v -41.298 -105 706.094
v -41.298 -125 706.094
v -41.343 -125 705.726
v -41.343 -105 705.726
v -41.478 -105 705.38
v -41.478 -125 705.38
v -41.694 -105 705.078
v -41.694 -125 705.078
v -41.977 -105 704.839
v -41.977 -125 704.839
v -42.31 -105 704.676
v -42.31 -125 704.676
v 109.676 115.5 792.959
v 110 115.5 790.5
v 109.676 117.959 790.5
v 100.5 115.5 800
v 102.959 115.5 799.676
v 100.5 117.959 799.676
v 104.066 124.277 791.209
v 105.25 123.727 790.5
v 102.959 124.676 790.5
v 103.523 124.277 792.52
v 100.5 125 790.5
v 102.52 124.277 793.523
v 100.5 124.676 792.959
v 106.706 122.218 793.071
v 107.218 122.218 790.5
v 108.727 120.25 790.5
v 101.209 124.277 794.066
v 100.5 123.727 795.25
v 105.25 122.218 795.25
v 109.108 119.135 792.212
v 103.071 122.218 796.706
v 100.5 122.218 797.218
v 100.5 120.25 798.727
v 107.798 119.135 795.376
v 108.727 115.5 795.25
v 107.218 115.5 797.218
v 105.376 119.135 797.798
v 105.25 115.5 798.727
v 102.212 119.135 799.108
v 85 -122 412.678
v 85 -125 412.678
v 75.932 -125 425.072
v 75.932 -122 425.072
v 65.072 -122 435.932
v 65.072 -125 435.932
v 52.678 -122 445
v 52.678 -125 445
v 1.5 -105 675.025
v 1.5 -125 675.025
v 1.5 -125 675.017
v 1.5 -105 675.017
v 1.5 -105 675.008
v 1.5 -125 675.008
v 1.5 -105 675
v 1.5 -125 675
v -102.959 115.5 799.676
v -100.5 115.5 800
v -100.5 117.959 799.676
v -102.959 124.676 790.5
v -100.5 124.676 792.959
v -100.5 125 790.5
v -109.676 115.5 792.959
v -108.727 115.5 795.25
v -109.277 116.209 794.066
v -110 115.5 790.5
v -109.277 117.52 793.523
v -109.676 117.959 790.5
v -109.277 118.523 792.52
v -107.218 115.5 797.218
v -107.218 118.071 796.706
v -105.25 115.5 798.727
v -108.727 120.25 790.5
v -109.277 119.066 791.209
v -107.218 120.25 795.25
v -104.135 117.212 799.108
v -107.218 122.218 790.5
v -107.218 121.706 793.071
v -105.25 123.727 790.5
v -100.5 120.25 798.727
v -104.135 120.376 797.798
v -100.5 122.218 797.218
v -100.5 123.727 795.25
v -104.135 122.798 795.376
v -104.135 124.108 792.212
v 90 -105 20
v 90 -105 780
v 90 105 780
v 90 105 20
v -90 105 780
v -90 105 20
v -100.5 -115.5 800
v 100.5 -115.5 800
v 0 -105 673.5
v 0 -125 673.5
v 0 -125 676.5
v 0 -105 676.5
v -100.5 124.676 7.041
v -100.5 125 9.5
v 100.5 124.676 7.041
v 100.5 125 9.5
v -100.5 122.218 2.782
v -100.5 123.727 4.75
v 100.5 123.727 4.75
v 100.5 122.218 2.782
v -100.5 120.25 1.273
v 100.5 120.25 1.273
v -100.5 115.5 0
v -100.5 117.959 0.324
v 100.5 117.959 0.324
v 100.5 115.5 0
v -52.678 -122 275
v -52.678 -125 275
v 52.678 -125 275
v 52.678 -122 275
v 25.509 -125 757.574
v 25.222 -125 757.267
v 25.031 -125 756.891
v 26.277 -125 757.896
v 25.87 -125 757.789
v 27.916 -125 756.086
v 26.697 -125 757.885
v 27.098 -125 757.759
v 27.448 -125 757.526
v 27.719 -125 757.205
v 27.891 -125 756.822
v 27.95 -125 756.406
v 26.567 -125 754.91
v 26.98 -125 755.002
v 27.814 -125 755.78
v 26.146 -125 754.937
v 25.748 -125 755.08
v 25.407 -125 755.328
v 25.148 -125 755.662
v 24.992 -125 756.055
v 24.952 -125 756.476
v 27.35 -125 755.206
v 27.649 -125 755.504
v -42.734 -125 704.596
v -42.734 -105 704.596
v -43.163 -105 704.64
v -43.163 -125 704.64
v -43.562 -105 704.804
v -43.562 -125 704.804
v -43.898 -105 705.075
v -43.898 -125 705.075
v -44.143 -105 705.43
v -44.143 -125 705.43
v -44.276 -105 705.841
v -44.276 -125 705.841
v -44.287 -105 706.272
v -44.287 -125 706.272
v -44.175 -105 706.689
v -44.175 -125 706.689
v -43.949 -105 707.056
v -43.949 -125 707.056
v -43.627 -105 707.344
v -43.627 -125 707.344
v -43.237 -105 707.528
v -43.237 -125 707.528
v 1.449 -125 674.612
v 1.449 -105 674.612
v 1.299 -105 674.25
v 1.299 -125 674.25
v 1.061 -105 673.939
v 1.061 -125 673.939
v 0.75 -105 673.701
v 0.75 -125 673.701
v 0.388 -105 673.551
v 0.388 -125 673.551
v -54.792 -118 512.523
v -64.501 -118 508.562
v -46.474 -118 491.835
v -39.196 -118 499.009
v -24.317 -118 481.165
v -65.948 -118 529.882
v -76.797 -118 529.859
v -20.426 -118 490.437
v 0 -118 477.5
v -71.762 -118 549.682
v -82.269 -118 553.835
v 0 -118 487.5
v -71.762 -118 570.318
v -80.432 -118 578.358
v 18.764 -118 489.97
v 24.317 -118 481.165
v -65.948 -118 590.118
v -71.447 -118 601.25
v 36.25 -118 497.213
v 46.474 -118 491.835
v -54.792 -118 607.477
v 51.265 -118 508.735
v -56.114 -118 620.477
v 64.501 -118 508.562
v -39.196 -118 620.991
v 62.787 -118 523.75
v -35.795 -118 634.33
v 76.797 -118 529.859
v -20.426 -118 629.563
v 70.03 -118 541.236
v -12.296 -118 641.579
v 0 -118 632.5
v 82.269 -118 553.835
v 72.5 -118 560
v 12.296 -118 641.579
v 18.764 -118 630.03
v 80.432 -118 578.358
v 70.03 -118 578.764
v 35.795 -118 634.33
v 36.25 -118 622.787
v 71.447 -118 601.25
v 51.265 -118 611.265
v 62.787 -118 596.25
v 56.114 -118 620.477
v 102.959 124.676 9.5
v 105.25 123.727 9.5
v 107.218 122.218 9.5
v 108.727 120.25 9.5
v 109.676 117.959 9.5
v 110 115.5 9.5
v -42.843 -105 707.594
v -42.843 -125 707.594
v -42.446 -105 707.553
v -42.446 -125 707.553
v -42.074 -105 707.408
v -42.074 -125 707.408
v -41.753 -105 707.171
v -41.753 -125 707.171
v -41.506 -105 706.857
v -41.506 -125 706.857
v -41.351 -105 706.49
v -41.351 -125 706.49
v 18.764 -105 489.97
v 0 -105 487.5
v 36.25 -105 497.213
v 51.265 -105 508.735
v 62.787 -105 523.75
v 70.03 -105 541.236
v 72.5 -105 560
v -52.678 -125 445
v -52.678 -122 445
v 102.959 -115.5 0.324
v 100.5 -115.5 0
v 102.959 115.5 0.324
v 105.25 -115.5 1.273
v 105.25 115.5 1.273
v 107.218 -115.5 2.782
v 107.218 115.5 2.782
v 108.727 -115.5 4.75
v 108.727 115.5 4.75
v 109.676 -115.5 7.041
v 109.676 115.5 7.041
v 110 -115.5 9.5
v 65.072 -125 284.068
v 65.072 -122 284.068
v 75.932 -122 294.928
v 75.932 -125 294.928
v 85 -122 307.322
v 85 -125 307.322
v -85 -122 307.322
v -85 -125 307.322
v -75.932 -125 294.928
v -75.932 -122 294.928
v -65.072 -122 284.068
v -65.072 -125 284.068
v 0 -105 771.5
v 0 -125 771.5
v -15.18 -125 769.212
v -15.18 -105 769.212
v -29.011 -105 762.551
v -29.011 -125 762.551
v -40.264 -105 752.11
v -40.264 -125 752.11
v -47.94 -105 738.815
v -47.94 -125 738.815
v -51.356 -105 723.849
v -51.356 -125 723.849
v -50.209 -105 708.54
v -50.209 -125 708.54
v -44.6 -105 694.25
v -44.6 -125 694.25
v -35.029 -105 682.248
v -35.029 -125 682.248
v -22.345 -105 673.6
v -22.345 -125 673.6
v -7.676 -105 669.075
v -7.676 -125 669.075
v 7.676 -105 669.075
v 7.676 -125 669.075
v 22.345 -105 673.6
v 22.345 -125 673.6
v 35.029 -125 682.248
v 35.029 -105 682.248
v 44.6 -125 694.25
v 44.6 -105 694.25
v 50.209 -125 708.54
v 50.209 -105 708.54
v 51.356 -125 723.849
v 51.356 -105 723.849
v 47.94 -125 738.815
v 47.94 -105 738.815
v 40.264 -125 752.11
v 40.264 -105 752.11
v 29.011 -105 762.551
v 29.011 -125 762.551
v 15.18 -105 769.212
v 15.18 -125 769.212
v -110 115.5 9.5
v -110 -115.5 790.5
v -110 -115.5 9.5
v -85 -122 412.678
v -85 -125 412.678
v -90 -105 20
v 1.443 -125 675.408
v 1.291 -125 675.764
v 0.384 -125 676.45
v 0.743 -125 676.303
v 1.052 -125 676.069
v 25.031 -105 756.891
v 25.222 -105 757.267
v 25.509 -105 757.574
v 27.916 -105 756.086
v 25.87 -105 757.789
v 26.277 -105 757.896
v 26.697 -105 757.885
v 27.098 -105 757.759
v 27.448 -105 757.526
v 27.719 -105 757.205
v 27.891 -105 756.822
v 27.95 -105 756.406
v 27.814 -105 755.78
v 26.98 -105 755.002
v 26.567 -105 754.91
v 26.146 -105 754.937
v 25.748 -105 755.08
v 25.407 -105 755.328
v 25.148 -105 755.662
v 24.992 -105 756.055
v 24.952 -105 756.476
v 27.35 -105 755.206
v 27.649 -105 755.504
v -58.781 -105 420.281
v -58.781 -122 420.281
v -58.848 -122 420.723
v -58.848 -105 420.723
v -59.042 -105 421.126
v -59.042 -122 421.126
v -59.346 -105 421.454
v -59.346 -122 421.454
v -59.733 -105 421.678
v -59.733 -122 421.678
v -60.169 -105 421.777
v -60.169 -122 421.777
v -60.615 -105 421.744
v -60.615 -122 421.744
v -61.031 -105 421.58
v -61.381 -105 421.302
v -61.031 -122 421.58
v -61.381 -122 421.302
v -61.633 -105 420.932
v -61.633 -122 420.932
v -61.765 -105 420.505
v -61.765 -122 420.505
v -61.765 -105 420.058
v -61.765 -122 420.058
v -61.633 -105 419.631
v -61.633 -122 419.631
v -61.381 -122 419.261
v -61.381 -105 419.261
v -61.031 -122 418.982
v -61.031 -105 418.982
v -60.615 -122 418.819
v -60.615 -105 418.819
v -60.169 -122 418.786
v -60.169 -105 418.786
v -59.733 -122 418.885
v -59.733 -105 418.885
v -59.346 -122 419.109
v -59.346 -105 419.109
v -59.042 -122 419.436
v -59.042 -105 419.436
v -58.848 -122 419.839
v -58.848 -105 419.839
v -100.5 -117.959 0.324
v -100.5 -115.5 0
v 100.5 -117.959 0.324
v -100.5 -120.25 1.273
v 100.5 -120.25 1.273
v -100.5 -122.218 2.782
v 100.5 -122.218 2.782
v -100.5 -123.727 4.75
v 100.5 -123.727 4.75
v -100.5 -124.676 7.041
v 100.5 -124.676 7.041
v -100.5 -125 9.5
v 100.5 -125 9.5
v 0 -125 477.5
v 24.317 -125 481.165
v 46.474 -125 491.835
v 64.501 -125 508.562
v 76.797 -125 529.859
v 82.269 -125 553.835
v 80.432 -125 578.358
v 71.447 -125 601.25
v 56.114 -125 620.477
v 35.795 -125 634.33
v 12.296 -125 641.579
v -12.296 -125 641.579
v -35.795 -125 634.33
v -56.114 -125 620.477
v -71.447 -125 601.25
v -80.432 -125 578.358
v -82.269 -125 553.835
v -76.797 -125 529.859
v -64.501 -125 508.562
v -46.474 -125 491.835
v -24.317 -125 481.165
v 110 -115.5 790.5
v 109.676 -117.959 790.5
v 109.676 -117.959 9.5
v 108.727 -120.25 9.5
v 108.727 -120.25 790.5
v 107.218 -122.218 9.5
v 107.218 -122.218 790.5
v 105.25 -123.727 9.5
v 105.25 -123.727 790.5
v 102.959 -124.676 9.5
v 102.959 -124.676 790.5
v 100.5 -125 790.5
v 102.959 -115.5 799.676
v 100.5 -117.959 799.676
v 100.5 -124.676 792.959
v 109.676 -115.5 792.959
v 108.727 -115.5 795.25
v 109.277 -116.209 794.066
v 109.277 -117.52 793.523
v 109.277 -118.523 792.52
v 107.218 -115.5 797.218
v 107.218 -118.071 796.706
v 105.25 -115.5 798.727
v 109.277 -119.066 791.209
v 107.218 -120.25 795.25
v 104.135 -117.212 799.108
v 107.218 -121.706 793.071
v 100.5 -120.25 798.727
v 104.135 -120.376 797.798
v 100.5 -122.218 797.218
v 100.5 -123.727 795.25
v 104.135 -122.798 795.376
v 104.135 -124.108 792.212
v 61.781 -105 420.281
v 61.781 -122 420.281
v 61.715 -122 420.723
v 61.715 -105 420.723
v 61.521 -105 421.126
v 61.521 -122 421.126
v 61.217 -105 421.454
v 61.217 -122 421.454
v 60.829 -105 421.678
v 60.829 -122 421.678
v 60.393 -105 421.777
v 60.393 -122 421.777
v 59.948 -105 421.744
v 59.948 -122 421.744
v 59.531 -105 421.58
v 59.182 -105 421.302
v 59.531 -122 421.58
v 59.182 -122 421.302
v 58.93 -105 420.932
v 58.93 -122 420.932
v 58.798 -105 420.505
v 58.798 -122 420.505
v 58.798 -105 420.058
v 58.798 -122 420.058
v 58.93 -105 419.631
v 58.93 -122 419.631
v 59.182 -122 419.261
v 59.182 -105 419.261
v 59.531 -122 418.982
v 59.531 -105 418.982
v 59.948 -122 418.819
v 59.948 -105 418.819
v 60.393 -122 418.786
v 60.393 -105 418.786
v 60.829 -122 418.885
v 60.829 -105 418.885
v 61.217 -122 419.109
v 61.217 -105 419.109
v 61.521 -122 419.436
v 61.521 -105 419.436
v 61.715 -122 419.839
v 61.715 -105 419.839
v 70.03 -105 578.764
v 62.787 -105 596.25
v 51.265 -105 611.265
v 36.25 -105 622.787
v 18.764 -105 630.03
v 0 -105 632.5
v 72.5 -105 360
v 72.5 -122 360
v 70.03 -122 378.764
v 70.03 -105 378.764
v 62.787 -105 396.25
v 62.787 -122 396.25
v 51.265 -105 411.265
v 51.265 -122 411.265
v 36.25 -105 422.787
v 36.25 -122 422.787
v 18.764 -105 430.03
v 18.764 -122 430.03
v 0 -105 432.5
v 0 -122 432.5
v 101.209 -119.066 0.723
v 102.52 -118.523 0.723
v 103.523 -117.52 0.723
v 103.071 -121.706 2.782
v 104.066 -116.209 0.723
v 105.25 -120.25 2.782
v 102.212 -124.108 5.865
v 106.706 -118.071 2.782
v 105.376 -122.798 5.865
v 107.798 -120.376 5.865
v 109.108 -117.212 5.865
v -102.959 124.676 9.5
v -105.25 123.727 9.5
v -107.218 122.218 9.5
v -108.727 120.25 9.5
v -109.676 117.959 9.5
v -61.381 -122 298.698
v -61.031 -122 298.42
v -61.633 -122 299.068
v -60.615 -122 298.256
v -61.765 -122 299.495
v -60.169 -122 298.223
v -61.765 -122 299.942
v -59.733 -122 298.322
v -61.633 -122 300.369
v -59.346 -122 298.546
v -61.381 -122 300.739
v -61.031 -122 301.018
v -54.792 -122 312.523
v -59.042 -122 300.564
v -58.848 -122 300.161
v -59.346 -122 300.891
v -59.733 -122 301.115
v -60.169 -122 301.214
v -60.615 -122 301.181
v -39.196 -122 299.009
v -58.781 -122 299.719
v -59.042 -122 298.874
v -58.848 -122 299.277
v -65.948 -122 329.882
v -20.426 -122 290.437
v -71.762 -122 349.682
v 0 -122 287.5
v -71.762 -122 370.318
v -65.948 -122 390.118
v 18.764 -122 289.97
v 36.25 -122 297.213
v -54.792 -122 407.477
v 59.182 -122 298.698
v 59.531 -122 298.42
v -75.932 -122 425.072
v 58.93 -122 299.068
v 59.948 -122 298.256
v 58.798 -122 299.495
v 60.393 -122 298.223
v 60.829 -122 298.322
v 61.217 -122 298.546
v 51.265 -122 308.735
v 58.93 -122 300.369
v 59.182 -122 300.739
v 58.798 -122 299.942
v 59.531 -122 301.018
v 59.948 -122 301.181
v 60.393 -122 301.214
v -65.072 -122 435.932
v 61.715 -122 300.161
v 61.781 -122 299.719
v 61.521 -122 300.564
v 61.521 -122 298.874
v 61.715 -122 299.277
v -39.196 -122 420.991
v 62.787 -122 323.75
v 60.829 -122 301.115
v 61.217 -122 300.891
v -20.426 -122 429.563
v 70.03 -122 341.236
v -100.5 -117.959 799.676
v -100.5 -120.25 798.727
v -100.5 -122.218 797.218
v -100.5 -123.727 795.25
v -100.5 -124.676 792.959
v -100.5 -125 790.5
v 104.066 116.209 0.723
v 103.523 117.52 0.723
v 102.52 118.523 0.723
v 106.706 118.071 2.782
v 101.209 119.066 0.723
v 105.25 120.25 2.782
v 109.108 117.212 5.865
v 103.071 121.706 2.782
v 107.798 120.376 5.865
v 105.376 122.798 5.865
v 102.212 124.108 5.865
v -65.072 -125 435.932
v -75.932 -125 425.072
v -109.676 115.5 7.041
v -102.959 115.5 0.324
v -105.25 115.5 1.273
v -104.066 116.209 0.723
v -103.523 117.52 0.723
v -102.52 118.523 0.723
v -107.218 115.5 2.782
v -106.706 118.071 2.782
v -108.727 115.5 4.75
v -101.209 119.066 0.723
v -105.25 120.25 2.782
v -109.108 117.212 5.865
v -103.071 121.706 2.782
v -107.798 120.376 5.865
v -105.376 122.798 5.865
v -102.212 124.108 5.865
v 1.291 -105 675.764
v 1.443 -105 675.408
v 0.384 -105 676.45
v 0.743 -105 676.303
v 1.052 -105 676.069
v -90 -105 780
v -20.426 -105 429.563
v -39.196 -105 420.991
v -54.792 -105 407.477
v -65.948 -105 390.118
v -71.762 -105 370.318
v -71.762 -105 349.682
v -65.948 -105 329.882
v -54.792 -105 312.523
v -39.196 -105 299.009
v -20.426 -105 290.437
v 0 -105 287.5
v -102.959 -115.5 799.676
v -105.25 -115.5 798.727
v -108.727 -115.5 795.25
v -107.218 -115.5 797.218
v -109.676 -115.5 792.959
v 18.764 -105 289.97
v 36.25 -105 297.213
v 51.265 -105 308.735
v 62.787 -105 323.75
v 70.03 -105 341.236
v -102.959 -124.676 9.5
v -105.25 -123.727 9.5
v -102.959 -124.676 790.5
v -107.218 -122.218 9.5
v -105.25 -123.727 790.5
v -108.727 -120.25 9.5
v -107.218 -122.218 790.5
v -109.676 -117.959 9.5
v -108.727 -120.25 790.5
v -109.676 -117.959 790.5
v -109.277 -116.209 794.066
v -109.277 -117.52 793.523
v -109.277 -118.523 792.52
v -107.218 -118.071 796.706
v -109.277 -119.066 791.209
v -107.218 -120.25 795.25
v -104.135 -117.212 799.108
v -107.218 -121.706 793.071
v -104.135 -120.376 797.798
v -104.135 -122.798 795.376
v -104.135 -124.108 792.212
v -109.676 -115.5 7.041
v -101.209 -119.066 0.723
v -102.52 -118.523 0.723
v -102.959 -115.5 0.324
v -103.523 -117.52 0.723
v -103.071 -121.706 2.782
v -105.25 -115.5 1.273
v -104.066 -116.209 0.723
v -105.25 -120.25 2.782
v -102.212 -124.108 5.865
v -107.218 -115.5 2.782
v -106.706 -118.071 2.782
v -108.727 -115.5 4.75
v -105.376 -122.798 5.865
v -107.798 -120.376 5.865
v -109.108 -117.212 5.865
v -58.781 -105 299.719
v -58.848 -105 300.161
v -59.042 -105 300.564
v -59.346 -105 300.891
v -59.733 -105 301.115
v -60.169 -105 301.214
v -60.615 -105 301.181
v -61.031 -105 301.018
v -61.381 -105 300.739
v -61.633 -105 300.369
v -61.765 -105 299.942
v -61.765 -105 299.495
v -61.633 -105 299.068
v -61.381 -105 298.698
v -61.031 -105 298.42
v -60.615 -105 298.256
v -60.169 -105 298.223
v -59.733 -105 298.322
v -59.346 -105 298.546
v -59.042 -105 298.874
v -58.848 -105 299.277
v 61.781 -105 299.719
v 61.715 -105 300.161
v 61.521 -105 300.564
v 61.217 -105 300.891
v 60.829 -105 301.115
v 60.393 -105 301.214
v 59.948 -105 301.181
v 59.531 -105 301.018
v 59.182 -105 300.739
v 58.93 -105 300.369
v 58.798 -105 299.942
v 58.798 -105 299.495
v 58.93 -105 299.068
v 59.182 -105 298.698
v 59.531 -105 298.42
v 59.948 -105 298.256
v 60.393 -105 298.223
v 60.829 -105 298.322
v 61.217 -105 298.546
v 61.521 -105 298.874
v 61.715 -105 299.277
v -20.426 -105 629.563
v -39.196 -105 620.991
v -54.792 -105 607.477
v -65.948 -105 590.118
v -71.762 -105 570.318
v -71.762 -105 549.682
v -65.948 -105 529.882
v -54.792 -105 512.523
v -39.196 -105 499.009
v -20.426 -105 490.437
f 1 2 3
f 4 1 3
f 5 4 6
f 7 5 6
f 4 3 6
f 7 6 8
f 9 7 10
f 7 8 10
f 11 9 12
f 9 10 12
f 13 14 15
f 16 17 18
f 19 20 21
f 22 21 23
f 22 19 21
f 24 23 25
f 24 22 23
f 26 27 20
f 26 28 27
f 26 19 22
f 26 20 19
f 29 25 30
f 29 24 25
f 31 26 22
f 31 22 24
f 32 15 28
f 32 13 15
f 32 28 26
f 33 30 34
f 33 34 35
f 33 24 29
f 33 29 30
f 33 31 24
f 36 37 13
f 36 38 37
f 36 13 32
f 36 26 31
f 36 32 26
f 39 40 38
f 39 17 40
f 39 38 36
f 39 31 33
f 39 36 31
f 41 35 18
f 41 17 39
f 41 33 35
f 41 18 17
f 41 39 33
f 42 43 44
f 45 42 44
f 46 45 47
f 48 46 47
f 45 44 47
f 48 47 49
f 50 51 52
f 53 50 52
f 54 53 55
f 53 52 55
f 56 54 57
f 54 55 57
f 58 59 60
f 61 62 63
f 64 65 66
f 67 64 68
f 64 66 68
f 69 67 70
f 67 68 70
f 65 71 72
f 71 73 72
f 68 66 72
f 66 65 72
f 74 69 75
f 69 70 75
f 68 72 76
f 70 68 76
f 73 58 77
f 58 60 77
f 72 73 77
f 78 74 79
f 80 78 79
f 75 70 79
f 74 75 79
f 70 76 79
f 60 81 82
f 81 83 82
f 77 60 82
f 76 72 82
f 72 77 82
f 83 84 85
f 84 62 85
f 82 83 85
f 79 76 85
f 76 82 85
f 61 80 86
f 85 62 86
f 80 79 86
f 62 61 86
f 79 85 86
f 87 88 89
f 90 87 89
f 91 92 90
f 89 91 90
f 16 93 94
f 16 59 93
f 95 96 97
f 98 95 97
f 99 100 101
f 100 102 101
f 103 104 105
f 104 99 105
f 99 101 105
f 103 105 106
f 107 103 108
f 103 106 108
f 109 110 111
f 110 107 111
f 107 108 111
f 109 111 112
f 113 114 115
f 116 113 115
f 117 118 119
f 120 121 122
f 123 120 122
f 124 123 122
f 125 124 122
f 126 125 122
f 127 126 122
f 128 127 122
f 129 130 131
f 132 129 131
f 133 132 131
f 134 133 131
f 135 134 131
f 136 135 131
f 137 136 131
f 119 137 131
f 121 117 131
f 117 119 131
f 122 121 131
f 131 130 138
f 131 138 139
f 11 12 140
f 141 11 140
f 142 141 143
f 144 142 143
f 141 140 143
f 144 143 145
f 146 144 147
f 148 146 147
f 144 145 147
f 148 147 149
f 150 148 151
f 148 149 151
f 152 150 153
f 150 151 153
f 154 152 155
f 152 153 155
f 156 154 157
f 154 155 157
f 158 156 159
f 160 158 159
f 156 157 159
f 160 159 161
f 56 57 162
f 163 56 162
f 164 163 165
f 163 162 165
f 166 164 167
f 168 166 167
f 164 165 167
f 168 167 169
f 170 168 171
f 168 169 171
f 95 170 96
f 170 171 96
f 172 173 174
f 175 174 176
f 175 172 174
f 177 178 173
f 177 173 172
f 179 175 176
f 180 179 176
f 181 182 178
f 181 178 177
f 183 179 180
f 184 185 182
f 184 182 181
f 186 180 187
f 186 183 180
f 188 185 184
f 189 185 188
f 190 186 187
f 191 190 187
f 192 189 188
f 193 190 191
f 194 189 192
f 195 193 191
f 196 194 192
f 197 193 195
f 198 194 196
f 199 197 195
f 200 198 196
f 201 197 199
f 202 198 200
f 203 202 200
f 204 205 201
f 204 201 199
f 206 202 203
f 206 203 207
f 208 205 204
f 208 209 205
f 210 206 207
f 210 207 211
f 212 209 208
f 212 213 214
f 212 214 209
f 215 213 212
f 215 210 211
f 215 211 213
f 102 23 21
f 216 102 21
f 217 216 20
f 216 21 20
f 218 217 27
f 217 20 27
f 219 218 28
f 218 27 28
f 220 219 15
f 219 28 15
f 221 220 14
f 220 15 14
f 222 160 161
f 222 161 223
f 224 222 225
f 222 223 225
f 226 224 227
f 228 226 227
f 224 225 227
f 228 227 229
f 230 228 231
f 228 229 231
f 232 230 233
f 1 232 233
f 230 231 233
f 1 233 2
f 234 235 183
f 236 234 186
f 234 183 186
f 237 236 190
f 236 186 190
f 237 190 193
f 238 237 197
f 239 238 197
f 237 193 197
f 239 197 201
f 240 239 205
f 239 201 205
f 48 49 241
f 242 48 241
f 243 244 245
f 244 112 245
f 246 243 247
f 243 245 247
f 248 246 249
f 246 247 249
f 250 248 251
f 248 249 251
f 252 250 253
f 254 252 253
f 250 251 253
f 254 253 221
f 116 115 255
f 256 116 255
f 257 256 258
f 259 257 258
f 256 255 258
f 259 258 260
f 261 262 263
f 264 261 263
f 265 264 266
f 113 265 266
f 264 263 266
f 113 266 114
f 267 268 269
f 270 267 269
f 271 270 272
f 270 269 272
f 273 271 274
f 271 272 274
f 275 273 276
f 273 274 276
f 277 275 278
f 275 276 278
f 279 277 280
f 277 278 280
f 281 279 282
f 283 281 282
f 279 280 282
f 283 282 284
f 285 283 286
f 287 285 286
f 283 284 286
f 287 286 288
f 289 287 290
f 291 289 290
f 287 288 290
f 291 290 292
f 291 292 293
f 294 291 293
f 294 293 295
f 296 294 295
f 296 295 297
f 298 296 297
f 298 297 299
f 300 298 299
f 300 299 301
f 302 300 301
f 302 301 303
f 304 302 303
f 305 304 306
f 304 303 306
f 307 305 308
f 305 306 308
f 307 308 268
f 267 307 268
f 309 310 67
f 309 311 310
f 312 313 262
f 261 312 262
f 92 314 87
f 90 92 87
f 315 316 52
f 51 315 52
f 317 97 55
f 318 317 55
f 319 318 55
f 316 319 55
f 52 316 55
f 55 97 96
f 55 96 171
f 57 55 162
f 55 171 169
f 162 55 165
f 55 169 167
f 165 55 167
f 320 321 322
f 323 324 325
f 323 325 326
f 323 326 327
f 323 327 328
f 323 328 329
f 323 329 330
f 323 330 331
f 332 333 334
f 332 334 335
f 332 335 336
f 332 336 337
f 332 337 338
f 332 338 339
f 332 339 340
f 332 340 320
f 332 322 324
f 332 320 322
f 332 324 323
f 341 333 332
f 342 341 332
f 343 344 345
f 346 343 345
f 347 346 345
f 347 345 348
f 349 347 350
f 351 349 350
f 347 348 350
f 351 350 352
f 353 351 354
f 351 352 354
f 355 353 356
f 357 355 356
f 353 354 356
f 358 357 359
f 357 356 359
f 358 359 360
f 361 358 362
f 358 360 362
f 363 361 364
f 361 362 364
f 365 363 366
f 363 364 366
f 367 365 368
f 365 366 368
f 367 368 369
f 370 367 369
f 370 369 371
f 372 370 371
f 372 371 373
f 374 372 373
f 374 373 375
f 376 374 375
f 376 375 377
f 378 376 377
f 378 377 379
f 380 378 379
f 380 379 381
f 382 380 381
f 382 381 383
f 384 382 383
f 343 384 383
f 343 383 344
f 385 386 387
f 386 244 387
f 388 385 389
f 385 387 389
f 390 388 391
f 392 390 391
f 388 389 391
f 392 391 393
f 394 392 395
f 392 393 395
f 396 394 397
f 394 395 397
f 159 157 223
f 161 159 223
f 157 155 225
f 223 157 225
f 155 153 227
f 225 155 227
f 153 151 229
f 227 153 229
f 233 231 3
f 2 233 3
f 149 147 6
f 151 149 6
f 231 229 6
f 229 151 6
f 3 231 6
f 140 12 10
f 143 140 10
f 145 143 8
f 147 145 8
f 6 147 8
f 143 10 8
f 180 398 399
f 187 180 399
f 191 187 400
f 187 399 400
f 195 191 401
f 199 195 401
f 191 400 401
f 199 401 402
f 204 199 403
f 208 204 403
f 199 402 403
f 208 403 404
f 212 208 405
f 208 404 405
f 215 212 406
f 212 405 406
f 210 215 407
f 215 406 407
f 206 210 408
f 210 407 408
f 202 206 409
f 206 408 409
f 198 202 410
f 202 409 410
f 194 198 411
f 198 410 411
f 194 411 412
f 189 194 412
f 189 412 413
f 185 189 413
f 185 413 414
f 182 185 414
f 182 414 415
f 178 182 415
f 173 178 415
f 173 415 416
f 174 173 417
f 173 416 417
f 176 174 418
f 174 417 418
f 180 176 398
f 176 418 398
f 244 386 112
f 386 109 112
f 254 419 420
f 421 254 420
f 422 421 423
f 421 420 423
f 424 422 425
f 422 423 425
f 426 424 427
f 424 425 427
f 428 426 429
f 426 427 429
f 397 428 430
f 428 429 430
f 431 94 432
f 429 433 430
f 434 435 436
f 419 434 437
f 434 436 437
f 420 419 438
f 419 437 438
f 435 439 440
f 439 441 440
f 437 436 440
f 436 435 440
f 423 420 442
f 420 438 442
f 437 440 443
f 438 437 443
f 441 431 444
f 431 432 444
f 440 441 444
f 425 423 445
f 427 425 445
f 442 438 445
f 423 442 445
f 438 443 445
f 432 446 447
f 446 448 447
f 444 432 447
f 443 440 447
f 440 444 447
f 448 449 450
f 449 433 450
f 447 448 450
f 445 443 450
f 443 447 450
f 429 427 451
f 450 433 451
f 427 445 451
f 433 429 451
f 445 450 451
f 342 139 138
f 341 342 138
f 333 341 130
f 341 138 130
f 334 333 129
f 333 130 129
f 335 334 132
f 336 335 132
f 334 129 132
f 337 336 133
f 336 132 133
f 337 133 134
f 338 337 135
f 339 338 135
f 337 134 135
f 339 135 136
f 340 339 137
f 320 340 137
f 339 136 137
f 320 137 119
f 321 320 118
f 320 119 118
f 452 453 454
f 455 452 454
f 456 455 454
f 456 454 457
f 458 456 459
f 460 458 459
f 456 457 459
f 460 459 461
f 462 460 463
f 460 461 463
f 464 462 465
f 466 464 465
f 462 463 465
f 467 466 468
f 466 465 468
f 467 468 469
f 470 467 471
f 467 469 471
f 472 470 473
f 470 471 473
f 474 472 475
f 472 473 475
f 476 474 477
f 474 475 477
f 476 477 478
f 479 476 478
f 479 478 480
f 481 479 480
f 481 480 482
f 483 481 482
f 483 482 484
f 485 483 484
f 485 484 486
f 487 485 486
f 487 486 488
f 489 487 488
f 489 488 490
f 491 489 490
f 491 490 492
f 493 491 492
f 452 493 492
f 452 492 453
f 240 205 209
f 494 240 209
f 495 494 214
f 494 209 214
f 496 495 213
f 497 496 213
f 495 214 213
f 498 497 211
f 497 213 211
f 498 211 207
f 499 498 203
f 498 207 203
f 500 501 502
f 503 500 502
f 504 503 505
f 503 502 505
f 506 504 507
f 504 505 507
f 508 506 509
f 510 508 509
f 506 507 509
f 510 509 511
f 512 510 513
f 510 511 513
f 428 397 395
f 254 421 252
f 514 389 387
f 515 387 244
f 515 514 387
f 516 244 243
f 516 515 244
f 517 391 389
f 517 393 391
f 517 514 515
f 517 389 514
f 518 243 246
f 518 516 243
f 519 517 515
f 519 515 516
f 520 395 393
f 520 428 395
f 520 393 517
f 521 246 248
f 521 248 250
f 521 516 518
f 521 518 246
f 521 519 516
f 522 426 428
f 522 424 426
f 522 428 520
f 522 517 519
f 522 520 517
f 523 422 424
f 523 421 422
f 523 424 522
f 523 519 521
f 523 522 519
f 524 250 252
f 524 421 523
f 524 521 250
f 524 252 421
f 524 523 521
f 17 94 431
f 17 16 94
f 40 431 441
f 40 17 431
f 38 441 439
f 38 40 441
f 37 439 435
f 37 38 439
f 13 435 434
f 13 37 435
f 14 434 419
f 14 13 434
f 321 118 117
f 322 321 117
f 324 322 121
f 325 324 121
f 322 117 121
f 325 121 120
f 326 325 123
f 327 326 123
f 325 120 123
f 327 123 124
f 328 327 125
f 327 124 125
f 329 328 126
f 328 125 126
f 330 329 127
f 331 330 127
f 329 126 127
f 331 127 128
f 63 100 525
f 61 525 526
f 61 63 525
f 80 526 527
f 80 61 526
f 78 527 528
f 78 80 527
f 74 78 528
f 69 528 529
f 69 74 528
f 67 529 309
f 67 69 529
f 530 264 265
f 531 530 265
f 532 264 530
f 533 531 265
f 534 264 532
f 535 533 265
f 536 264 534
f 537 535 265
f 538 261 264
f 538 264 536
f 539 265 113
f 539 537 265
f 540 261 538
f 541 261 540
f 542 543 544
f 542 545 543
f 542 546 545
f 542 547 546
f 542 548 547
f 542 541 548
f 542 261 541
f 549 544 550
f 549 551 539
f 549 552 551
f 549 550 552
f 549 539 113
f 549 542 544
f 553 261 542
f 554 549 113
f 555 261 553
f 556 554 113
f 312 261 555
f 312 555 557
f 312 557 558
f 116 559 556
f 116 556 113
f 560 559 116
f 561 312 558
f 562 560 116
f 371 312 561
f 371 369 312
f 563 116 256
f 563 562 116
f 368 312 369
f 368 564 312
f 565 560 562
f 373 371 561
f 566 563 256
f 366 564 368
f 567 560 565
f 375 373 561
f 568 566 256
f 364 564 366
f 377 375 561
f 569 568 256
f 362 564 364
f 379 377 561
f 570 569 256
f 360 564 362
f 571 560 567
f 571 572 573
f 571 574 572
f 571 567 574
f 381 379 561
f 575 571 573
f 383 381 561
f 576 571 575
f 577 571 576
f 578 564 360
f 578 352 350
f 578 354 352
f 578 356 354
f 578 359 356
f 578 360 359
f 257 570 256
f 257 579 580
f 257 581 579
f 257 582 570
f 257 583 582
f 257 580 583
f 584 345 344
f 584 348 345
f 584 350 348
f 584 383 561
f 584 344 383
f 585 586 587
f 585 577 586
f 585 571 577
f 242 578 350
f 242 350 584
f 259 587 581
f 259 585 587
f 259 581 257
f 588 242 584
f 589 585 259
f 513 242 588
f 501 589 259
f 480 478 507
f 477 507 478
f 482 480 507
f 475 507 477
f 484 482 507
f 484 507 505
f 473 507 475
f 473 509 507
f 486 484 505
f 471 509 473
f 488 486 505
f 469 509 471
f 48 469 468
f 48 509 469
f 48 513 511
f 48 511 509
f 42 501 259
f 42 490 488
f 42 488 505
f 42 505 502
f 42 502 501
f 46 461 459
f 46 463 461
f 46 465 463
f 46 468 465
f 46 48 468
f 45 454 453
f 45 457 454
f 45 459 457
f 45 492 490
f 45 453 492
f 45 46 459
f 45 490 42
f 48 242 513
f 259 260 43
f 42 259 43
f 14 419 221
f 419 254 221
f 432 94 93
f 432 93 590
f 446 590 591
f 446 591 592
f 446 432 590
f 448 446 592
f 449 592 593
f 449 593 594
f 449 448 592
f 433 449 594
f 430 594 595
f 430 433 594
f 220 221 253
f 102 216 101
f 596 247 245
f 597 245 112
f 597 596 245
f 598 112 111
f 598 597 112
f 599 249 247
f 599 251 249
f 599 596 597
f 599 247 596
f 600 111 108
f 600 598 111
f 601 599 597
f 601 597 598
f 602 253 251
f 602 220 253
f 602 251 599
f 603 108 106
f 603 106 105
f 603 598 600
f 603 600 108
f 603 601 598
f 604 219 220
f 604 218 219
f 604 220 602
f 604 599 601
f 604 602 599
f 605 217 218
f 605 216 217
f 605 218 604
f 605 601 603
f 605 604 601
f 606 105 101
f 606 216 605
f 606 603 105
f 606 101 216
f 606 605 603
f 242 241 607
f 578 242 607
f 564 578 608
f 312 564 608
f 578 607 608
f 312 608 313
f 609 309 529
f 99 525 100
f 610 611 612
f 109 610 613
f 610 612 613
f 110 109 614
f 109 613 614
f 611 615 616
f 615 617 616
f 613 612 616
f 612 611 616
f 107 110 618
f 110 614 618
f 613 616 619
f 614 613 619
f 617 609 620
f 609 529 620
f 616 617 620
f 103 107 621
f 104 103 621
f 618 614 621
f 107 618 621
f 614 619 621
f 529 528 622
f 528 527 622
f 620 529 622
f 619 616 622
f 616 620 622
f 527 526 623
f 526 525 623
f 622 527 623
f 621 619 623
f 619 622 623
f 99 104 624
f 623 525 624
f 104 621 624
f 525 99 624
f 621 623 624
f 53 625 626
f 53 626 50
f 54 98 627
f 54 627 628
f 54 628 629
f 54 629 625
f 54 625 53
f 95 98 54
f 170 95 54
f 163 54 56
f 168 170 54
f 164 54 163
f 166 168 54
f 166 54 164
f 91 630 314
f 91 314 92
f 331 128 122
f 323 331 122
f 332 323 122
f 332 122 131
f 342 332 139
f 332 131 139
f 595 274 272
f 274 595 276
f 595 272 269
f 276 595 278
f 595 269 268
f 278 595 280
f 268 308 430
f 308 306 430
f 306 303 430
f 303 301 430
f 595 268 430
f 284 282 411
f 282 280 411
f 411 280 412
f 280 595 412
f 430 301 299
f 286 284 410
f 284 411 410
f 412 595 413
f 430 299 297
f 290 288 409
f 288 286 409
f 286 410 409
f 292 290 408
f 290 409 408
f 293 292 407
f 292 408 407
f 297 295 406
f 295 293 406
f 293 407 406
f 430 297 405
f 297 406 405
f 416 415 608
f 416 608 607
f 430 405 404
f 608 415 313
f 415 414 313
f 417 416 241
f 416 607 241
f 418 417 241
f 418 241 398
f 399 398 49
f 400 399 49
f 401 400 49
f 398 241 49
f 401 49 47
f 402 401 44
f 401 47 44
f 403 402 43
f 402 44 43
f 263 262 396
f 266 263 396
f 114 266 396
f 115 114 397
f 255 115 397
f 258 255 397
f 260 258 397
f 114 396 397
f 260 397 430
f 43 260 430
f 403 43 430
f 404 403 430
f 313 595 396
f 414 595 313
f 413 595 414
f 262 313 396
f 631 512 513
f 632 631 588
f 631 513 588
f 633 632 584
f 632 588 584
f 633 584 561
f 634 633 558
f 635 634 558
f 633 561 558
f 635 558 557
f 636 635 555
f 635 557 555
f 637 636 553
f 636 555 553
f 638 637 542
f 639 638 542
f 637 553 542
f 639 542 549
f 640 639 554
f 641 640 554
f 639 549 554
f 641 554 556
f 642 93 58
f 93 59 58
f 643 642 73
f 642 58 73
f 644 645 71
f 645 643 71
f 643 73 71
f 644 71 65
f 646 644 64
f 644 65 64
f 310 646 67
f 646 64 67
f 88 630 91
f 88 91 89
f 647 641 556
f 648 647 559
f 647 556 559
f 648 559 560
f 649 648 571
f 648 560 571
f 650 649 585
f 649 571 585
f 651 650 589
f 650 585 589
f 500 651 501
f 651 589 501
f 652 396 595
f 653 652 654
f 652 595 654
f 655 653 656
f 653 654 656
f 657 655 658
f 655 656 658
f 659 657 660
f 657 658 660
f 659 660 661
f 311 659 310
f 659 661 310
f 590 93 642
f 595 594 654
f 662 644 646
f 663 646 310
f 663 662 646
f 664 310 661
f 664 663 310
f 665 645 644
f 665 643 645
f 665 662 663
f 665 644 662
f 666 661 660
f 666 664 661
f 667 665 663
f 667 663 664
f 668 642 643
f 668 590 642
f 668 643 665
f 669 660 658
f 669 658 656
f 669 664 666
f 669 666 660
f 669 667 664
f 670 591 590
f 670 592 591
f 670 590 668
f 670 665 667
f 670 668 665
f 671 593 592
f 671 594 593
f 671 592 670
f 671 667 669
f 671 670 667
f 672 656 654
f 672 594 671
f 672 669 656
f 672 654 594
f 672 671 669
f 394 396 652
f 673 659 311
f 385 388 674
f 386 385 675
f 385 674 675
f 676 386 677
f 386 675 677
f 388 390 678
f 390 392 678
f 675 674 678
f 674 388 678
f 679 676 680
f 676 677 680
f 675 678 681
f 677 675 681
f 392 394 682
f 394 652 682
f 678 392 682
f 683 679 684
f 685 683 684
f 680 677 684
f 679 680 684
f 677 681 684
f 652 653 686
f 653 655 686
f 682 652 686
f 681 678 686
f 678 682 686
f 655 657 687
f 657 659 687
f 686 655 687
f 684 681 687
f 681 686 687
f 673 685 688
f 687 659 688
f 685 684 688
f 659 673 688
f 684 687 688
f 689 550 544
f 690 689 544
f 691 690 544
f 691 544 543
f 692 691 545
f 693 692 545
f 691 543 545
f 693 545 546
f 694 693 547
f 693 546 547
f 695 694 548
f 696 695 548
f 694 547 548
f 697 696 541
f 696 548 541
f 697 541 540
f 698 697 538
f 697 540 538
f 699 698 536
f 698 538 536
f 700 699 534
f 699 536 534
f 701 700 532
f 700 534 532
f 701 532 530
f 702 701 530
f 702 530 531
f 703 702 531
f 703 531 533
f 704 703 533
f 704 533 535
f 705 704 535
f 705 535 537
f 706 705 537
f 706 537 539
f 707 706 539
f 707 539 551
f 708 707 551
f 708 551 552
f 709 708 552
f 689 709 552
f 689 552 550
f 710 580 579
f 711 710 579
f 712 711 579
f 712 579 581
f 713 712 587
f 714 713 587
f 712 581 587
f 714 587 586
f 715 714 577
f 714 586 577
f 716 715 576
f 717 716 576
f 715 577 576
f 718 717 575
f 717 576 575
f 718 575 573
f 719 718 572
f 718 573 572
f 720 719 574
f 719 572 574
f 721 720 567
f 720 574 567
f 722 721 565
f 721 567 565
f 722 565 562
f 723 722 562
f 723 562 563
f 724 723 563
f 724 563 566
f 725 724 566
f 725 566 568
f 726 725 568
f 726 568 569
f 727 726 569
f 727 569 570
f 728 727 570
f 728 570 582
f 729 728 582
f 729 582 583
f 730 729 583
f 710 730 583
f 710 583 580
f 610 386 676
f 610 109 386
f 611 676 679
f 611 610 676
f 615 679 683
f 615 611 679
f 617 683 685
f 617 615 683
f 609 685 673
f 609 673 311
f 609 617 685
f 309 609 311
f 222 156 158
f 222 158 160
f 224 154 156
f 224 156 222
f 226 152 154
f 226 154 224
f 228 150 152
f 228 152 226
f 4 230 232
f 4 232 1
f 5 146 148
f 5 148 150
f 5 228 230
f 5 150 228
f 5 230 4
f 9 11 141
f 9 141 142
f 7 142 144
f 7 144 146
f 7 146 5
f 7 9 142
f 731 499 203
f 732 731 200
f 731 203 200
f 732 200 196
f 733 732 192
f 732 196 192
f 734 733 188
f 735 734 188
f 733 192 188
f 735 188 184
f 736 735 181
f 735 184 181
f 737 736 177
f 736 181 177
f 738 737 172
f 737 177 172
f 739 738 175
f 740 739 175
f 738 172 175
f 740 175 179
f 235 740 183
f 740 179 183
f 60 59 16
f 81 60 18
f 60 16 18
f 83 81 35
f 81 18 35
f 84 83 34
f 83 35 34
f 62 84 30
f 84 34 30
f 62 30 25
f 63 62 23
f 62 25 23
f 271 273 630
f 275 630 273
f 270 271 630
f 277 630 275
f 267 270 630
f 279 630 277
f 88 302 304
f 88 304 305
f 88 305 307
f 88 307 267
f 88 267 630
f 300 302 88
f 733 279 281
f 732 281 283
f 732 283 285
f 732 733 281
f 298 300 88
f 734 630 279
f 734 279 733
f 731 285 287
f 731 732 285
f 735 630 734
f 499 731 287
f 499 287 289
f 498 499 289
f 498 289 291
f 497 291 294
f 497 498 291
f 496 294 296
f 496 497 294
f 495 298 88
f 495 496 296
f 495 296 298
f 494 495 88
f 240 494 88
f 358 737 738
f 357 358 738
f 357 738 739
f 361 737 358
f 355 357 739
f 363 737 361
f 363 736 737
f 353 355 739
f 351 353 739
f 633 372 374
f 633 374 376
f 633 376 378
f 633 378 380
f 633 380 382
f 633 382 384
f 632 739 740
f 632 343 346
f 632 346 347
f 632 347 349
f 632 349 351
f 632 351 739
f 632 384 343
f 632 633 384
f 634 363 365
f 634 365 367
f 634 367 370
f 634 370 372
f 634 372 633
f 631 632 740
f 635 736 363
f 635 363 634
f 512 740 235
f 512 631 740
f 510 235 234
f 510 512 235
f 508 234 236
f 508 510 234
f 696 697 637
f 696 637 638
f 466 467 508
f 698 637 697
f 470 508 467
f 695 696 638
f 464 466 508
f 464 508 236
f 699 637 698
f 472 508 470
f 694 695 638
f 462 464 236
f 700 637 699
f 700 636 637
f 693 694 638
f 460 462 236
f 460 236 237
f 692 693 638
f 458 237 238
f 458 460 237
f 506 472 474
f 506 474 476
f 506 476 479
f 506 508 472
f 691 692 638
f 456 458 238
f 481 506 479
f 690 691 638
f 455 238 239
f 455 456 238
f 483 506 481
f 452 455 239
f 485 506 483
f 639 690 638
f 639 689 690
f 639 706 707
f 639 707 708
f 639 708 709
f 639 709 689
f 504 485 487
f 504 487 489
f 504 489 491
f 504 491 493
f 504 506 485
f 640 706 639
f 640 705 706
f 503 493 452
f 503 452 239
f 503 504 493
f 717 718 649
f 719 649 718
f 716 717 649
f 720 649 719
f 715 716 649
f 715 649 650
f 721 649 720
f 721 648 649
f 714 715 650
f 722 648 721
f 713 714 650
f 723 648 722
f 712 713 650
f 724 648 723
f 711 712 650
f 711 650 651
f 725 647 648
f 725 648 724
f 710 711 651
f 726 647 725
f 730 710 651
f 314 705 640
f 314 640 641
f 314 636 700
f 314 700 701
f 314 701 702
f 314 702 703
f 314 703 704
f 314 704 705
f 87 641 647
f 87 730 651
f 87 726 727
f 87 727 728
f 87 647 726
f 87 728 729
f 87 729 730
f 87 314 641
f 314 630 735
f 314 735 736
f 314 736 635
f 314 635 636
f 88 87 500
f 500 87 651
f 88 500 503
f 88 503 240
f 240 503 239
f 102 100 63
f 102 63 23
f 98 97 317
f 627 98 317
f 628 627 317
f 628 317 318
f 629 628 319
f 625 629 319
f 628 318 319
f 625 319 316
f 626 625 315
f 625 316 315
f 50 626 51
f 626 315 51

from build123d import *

# Parameters (mm, degrees)
F0_W     = 180
F0_H     = 210
F1_DEPTH = 20
F0_W_2   = 220
F0_H_2   = 250
F2_DEPTH = 800
F3_W     = 180
F3_H     = 210
F4_DEPTH = 20
F5_R     = 1.5
F6_DEPTH = 20
F7_DEPTH = 7
F8_DEPTH = 3
F9_R     = 9.5


with BuildPart() as f1:
    # F0 (on Top) → F1 (new body)
    with BuildSketch(Plane.XY):
        Rectangle(F0_W, F0_H)
    extrude(amount=F1_DEPTH)

    # F0 (on Top) → F2 (join)
    with BuildSketch(Plane.XY):
        Rectangle(F0_W_2, F0_H_2)
        Rectangle(F0_W, F0_H, mode=Mode.SUBTRACT)
    extrude(amount=F2_DEPTH)

    # F3 (on face) → F4 (join)
    with BuildSketch(Plane.XY.offset(800)):
        Rectangle(F3_W, F3_H)
    extrude(amount=-F4_DEPTH)

    # F5 (on face) → F6 (cut)
    with BuildSketch(Plane.XZ.offset(125)):
        with BuildLine():
            ThreePointArc((51.5, 720), (36.4159992311, 756.4159992311), (0, 771.5))
            Line((0, 771.5), (0, 765))
            ThreePointArc((0, 765), (13.1905408693, 763.023361463), (25.2222847872, 757.2670947367))
            ThreePointArc((25.2222847872, 757.2670947367), (26.9019571294, 757.8361628294), (27.9503363532, 756.4057647469))
            ThreePointArc((27.9503363532, 756.4057647469), (27.8730087425, 755.9303667321), (27.6489986565, 755.5039839073))
            ThreePointArc((27.6489986565, 755.5039839073), (40.4302172857, 739.7584799574), (45, 720))
            ThreePointArc((45, 720), (44.5571276947, 713.7021931119), (43.2372279289, 707.5283473019))
            ThreePointArc((43.2372279289, 707.5283473019), (44.0036790141, 706.9859955787), (44.2975432333, 706.0942352531))
            ThreePointArc((44.2975432333, 706.0942352531), (43.6690774316, 704.8734043307), (42.3103057118, 704.6755740541))
            ThreePointArc((42.3103057118, 704.6755740541), (26.4503363532, 683.5942352531), (1.4997916522, 675.025))
            ThreePointArc((1.4997916522, 675.025), (1.4999479121, 675.0125004341), (1.5, 675))
            ThreePointArc((1.5, 675), (1.0606601718, 673.9393398282), (0, 673.5))
            Line((0, 673.5), (0, 668.5))
            ThreePointArc((0, 668.5), (36.4159992311, 683.5840007689), (51.5, 720))
        make_face()
        with BuildLine():
            Line((0, 765), (0, 771.5))
            ThreePointArc((0, 771.5), (-51.5, 720), (0, 668.5))
            Line((0, 668.5), (0, 673.5))
            ThreePointArc((0, 673.5), (-1.0694624818, 673.9482158016), (-1.4997916522, 675.025))
            ThreePointArc((-1.4997916522, 675.025), (-26.4503363532, 683.5942352531), (-42.3103057118, 704.6755740541))
            ThreePointArc((-42.3103057118, 704.6755740541), (-44.2241280077, 705.6307097616), (-43.2372279289, 707.5283473019))
            ThreePointArc((-43.2372279289, 707.5283473019), (-42.7975432333, 733.9057647469), (-27.6489986565, 755.5039839073))
            ThreePointArc((-27.6489986565, 755.5039839073), (-27.3320142316, 757.6192902384), (-25.2222847872, 757.2670947367))
            ThreePointArc((-25.2222847872, 757.2670947367), (-13.1905408693, 763.023361463), (0, 765))
        make_face()
        with BuildLine():
            ThreePointArc((25.2222847872, 757.2670947367), (13.1905408693, 763.023361463), (0, 765))
            Line((0, 765), (0, 760))
            ThreePointArc((0, 760), (28.2842712475, 748.2842712475), (40, 720))
            ThreePointArc((40, 720), (28.2842712475, 691.7157287525), (0, 680))
            Line((0, 680), (0, 676.5))
            ThreePointArc((0, 676.5), (1.0517841984, 676.0694624818), (1.4997916522, 675.025))
            ThreePointArc((1.4997916522, 675.025), (26.4503363532, 683.5942352531), (42.3103057118, 704.6755740541))
            ThreePointArc((42.3103057118, 704.6755740541), (41.3709584588, 706.5577607447), (43.2372279289, 707.5283473019))
            ThreePointArc((43.2372279289, 707.5283473019), (44.5571276947, 713.7021931119), (45, 720))
            ThreePointArc((45, 720), (40.4302172857, 739.7584799574), (27.6489986565, 755.5039839073))
            ThreePointArc((27.6489986565, 755.5039839073), (25.5686584747, 755.1922392553), (25.2222847872, 757.2670947367))
        make_face()
        with BuildLine():
            Line((0, 760), (0, 765))
            ThreePointArc((0, 765), (-13.1905408693, 763.023361463), (-25.2222847872, 757.2670947367))
            ThreePointArc((-25.2222847872, 757.2670947367), (-25.0199382706, 756.8573855231), (-24.9503363532, 756.4057647469))
            ThreePointArc((-24.9503363532, 756.4057647469), (-25.9749383383, 754.9830923575), (-27.6489986565, 755.5039839073))
            ThreePointArc((-27.6489986565, 755.5039839073), (-42.7975432333, 733.9057647469), (-43.2372279289, 707.5283473019))
            ThreePointArc((-43.2372279289, 707.5283473019), (-41.9057829077, 707.3003710339), (-41.2975432333, 706.0942352531))
            ThreePointArc((-41.2975432333, 706.0942352531), (-41.5767123109, 705.2227010548), (-42.3103057118, 704.6755740541))
            ThreePointArc((-42.3103057118, 704.6755740541), (-26.4503363532, 683.5942352531), (-1.4997916522, 675.025))
            ThreePointArc((-1.4997916522, 675.025), (-1.0517841984, 676.0694624818), (0, 676.5))
            Line((0, 676.5), (0, 680))
            ThreePointArc((0, 680), (-40, 720), (0, 760))
        make_face()
        with BuildLine():
            ThreePointArc((40, 720), (28.2842712475, 748.2842712475), (0, 760))
            Line((0, 760), (0, 680))
            ThreePointArc((0, 680), (28.2842712475, 691.7157287525), (40, 720))
        make_face()
        with BuildLine():
            Line((0, 680), (0, 760))
            ThreePointArc((0, 760), (-40, 720), (0, 680))
        make_face()
        with BuildLine():
            ThreePointArc((-24.9503363532, 756.4057647469), (-25.0199382706, 756.8573855231), (-25.2222847872, 757.2670947367))
            ThreePointArc((-25.2222847872, 757.2670947367), (-26.4503363532, 756.4057647469), (-27.6489986565, 755.5039839073))
            ThreePointArc((-27.6489986565, 755.5039839073), (-25.9749383383, 754.9830923575), (-24.9503363532, 756.4057647469))
        make_face()
        with BuildLine():
            ThreePointArc((-27.6489986565, 755.5039839073), (-26.4503363532, 756.4057647469), (-25.2222847872, 757.2670947367))
            ThreePointArc((-25.2222847872, 757.2670947367), (-27.3320142316, 757.6192902384), (-27.6489986565, 755.5039839073))
        make_face()
        with BuildLine():
            ThreePointArc((-1.4997916522, 675.025), (-1.0694624818, 673.9482158016), (0, 673.5))
            Line((0, 673.5), (0, 675))
            ThreePointArc((0, 675), (-0.75, 675.0062504341), (-1.4997916522, 675.025))
        make_face()
        with BuildLine():
            ThreePointArc((-1.4997916522, 675.025), (-0.75, 675.0062504341), (0, 675))
            Line((0, 675), (0, 676.5))
            ThreePointArc((0, 676.5), (-1.0517841984, 676.0694624818), (-1.4997916522, 675.025))
        make_face()
        with BuildLine():
            ThreePointArc((72.5, 560), (51.265241636, 611.265241636), (0, 632.5))
            Line((0, 632.5), (0, 487.5))
            ThreePointArc((0, 487.5), (51.265241636, 508.734758364), (72.5, 560))
        make_face()
        with BuildLine():
            Line((0, 487.5), (0, 632.5))
            ThreePointArc((0, 632.5), (-72.5, 560), (0, 487.5))
        make_face()
        with BuildLine():
            ThreePointArc((44.2975432333, 706.0942352531), (44.0036790141, 706.9859955787), (43.2372279289, 707.5283473019))
            ThreePointArc((43.2372279289, 707.5283473019), (42.7975432333, 706.0942352531), (42.3103057118, 704.6755740541))
            ThreePointArc((42.3103057118, 704.6755740541), (43.6690774316, 704.8734043307), (44.2975432333, 706.0942352531))
        make_face()
        with BuildLine():
            ThreePointArc((42.3103057118, 704.6755740541), (42.7975432333, 706.0942352531), (43.2372279289, 707.5283473019))
            ThreePointArc((43.2372279289, 707.5283473019), (41.3709584588, 706.5577607447), (42.3103057118, 704.6755740541))
        make_face()
        with BuildLine():
            ThreePointArc((0, 432.5), (-72.5, 360), (0, 287.5))
            Line((0, 287.5), (0, 432.5))
        make_face()
        with BuildLine():
            Line((0, 432.5), (0, 287.5))
            ThreePointArc((0, 287.5), (51.265241636, 308.734758364), (72.5, 360))
            ThreePointArc((72.5, 360), (51.265241636, 411.265241636), (0, 432.5))
        make_face()
        with Locations((-60.2813602239, 420.2813602239)):
            Circle(F5_R)
        with Locations((-60.2813602239, 299.7186397761)):
            Circle(F5_R)
        with Locations((60.2813602239, 299.7186397761)):
            Circle(F5_R)
        with Locations((60.2813602239, 420.2813602239)):
            Circle(F5_R)
    extrude(amount=-F6_DEPTH, mode=Mode.SUBTRACT)

    # F5 (on face) → F7 (cut)
    with BuildSketch(Plane.XZ.offset(125)):
        with BuildLine():
            Line((0, 632.5), (0, 642.5))
            ThreePointArc((0, 642.5), (-82.5, 560), (0, 477.5))
            Line((0, 477.5), (0, 487.5))
            ThreePointArc((0, 487.5), (-72.5, 560), (0, 632.5))
        make_face()
        with BuildLine():
            ThreePointArc((82.5, 560), (58.3363094479, 618.3363094479), (0, 642.5))
            Line((0, 642.5), (0, 632.5))
            ThreePointArc((0, 632.5), (51.265241636, 611.265241636), (72.5, 560))
            ThreePointArc((72.5, 560), (51.265241636, 508.734758364), (0, 487.5))
            Line((0, 487.5), (0, 477.5))
            ThreePointArc((0, 477.5), (58.3363094479, 501.6636905521), (82.5, 560))
        make_face()
    extrude(amount=-F7_DEPTH, mode=Mode.SUBTRACT)

    # F5 (on face) → F8 (cut)
    with BuildSketch(Plane.XZ.offset(125)):
        with BuildLine():
            Line((-52.6782687643, 275), (0, 275))
            Line((0, 275), (0, 287.5))
            ThreePointArc((0, 287.5), (-72.5, 360), (0, 432.5))
            Line((0, 432.5), (0, 445))
            Line((0, 445), (-52.6782687643, 445))
            ThreePointArc((-52.6782687643, 445), (-70.7106781187, 430.7106781187), (-85, 412.6782687643))
            Line((-85, 412.6782687643), (-85, 307.3217312357))
            ThreePointArc((-85, 307.3217312357), (-70.7106781187, 289.2893218813), (-52.6782687643, 275))
        make_face()
        with Locations((-60.2813602239, 299.7186397761)):
            Circle(F5_R, mode=Mode.SUBTRACT)
        with Locations((-60.2813602239, 420.2813602239)):
            Circle(F5_R, mode=Mode.SUBTRACT)
        with BuildLine():
            Line((0, 287.5), (0, 275))
            Line((0, 275), (52.6782687643, 275))
            ThreePointArc((52.6782687643, 275), (70.7106781187, 289.2893218813), (85, 307.3217312357))
            Line((85, 307.3217312357), (85, 412.6782687643))
            ThreePointArc((85, 412.6782687643), (70.7106781187, 430.7106781187), (52.6782687643, 445))
            Line((52.6782687643, 445), (0, 445))
            Line((0, 445), (0, 432.5))
            ThreePointArc((0, 432.5), (51.265241636, 411.265241636), (72.5, 360))
            ThreePointArc((72.5, 360), (51.265241636, 308.734758364), (0, 287.5))
        make_face()
        with Locations((60.2813602239, 299.7186397761)):
            Circle(F5_R, mode=Mode.SUBTRACT)
        with Locations((60.2813602239, 420.2813602239)):
            Circle(F5_R, mode=Mode.SUBTRACT)
        with BuildLine():
            Line((0, 765), (0, 771.5))
            ThreePointArc((0, 771.5), (-51.5, 720), (0, 668.5))
            Line((0, 668.5), (0, 673.5))
            ThreePointArc((0, 673.5), (-1.0694624818, 673.9482158016), (-1.4997916522, 675.025))
            ThreePointArc((-1.4997916522, 675.025), (-26.4503363532, 683.5942352531), (-42.3103057118, 704.6755740541))
            ThreePointArc((-42.3103057118, 704.6755740541), (-44.2241280077, 705.6307097616), (-43.2372279289, 707.5283473019))
            ThreePointArc((-43.2372279289, 707.5283473019), (-42.7975432333, 733.9057647469), (-27.6489986565, 755.5039839073))
            ThreePointArc((-27.6489986565, 755.5039839073), (-27.3320142316, 757.6192902384), (-25.2222847872, 757.2670947367))
            ThreePointArc((-25.2222847872, 757.2670947367), (-13.1905408693, 763.023361463), (0, 765))
        make_face()
        with BuildLine():
            ThreePointArc((51.5, 720), (36.4159992311, 756.4159992311), (0, 771.5))
            Line((0, 771.5), (0, 765))
            ThreePointArc((0, 765), (13.1905408693, 763.023361463), (25.2222847872, 757.2670947367))
            ThreePointArc((25.2222847872, 757.2670947367), (26.9019571294, 757.8361628294), (27.9503363532, 756.4057647469))
            ThreePointArc((27.9503363532, 756.4057647469), (27.8730087425, 755.9303667321), (27.6489986565, 755.5039839073))
            ThreePointArc((27.6489986565, 755.5039839073), (40.4302172857, 739.7584799574), (45, 720))
            ThreePointArc((45, 720), (44.5571276947, 713.7021931119), (43.2372279289, 707.5283473019))
            ThreePointArc((43.2372279289, 707.5283473019), (44.0036790141, 706.9859955787), (44.2975432333, 706.0942352531))
            ThreePointArc((44.2975432333, 706.0942352531), (43.6690774316, 704.8734043307), (42.3103057118, 704.6755740541))
            ThreePointArc((42.3103057118, 704.6755740541), (26.4503363532, 683.5942352531), (1.4997916522, 675.025))
            ThreePointArc((1.4997916522, 675.025), (1.4999479121, 675.0125004341), (1.5, 675))
            ThreePointArc((1.5, 675), (1.0606601718, 673.9393398282), (0, 673.5))
            Line((0, 673.5), (0, 668.5))
            ThreePointArc((0, 668.5), (36.4159992311, 683.5840007689), (51.5, 720))
        make_face()
        with BuildLine():
            Line((0, 760), (0, 765))
            ThreePointArc((0, 765), (-13.1905408693, 763.023361463), (-25.2222847872, 757.2670947367))
            ThreePointArc((-25.2222847872, 757.2670947367), (-25.0199382706, 756.8573855231), (-24.9503363532, 756.4057647469))
            ThreePointArc((-24.9503363532, 756.4057647469), (-25.9749383383, 754.9830923575), (-27.6489986565, 755.5039839073))
            ThreePointArc((-27.6489986565, 755.5039839073), (-42.7975432333, 733.9057647469), (-43.2372279289, 707.5283473019))
            ThreePointArc((-43.2372279289, 707.5283473019), (-41.9057829077, 707.3003710339), (-41.2975432333, 706.0942352531))
            ThreePointArc((-41.2975432333, 706.0942352531), (-41.5767123109, 705.2227010548), (-42.3103057118, 704.6755740541))
            ThreePointArc((-42.3103057118, 704.6755740541), (-26.4503363532, 683.5942352531), (-1.4997916522, 675.025))
            ThreePointArc((-1.4997916522, 675.025), (-1.0517841984, 676.0694624818), (0, 676.5))
            Line((0, 676.5), (0, 680))
            ThreePointArc((0, 680), (-40, 720), (0, 760))
        make_face()
        with BuildLine():
            ThreePointArc((25.2222847872, 757.2670947367), (13.1905408693, 763.023361463), (0, 765))
            Line((0, 765), (0, 760))
            ThreePointArc((0, 760), (28.2842712475, 748.2842712475), (40, 720))
            ThreePointArc((40, 720), (28.2842712475, 691.7157287525), (0, 680))
            Line((0, 680), (0, 676.5))
            ThreePointArc((0, 676.5), (1.0517841984, 676.0694624818), (1.4997916522, 675.025))
            ThreePointArc((1.4997916522, 675.025), (26.4503363532, 683.5942352531), (42.3103057118, 704.6755740541))
            ThreePointArc((42.3103057118, 704.6755740541), (41.3709584588, 706.5577607447), (43.2372279289, 707.5283473019))
            ThreePointArc((43.2372279289, 707.5283473019), (44.5571276947, 713.7021931119), (45, 720))
            ThreePointArc((45, 720), (40.4302172857, 739.7584799574), (27.6489986565, 755.5039839073))
            ThreePointArc((27.6489986565, 755.5039839073), (25.5686584747, 755.1922392553), (25.2222847872, 757.2670947367))
        make_face()
    extrude(amount=-F8_DEPTH, mode=Mode.SUBTRACT)

    # F9
    f9_edges = [f1.edges().sort_by_distance(p)[0] for p in [
        (0, -125, 800),
        (110, 0, 800),
        (110, -125, 400),
        (110, 125, 400),
        (0, 125, 800),
        (-110, 0, 800),
        (-110, -125, 400),
        (0, -125, 0),
        (-110, 125, 400),
        (-110, 0, 0),
        (110, 0, 0),
        (0, 125, 0),
    ]]
    fillet(f9_edges, radius=F9_R)


solid = f1.part
